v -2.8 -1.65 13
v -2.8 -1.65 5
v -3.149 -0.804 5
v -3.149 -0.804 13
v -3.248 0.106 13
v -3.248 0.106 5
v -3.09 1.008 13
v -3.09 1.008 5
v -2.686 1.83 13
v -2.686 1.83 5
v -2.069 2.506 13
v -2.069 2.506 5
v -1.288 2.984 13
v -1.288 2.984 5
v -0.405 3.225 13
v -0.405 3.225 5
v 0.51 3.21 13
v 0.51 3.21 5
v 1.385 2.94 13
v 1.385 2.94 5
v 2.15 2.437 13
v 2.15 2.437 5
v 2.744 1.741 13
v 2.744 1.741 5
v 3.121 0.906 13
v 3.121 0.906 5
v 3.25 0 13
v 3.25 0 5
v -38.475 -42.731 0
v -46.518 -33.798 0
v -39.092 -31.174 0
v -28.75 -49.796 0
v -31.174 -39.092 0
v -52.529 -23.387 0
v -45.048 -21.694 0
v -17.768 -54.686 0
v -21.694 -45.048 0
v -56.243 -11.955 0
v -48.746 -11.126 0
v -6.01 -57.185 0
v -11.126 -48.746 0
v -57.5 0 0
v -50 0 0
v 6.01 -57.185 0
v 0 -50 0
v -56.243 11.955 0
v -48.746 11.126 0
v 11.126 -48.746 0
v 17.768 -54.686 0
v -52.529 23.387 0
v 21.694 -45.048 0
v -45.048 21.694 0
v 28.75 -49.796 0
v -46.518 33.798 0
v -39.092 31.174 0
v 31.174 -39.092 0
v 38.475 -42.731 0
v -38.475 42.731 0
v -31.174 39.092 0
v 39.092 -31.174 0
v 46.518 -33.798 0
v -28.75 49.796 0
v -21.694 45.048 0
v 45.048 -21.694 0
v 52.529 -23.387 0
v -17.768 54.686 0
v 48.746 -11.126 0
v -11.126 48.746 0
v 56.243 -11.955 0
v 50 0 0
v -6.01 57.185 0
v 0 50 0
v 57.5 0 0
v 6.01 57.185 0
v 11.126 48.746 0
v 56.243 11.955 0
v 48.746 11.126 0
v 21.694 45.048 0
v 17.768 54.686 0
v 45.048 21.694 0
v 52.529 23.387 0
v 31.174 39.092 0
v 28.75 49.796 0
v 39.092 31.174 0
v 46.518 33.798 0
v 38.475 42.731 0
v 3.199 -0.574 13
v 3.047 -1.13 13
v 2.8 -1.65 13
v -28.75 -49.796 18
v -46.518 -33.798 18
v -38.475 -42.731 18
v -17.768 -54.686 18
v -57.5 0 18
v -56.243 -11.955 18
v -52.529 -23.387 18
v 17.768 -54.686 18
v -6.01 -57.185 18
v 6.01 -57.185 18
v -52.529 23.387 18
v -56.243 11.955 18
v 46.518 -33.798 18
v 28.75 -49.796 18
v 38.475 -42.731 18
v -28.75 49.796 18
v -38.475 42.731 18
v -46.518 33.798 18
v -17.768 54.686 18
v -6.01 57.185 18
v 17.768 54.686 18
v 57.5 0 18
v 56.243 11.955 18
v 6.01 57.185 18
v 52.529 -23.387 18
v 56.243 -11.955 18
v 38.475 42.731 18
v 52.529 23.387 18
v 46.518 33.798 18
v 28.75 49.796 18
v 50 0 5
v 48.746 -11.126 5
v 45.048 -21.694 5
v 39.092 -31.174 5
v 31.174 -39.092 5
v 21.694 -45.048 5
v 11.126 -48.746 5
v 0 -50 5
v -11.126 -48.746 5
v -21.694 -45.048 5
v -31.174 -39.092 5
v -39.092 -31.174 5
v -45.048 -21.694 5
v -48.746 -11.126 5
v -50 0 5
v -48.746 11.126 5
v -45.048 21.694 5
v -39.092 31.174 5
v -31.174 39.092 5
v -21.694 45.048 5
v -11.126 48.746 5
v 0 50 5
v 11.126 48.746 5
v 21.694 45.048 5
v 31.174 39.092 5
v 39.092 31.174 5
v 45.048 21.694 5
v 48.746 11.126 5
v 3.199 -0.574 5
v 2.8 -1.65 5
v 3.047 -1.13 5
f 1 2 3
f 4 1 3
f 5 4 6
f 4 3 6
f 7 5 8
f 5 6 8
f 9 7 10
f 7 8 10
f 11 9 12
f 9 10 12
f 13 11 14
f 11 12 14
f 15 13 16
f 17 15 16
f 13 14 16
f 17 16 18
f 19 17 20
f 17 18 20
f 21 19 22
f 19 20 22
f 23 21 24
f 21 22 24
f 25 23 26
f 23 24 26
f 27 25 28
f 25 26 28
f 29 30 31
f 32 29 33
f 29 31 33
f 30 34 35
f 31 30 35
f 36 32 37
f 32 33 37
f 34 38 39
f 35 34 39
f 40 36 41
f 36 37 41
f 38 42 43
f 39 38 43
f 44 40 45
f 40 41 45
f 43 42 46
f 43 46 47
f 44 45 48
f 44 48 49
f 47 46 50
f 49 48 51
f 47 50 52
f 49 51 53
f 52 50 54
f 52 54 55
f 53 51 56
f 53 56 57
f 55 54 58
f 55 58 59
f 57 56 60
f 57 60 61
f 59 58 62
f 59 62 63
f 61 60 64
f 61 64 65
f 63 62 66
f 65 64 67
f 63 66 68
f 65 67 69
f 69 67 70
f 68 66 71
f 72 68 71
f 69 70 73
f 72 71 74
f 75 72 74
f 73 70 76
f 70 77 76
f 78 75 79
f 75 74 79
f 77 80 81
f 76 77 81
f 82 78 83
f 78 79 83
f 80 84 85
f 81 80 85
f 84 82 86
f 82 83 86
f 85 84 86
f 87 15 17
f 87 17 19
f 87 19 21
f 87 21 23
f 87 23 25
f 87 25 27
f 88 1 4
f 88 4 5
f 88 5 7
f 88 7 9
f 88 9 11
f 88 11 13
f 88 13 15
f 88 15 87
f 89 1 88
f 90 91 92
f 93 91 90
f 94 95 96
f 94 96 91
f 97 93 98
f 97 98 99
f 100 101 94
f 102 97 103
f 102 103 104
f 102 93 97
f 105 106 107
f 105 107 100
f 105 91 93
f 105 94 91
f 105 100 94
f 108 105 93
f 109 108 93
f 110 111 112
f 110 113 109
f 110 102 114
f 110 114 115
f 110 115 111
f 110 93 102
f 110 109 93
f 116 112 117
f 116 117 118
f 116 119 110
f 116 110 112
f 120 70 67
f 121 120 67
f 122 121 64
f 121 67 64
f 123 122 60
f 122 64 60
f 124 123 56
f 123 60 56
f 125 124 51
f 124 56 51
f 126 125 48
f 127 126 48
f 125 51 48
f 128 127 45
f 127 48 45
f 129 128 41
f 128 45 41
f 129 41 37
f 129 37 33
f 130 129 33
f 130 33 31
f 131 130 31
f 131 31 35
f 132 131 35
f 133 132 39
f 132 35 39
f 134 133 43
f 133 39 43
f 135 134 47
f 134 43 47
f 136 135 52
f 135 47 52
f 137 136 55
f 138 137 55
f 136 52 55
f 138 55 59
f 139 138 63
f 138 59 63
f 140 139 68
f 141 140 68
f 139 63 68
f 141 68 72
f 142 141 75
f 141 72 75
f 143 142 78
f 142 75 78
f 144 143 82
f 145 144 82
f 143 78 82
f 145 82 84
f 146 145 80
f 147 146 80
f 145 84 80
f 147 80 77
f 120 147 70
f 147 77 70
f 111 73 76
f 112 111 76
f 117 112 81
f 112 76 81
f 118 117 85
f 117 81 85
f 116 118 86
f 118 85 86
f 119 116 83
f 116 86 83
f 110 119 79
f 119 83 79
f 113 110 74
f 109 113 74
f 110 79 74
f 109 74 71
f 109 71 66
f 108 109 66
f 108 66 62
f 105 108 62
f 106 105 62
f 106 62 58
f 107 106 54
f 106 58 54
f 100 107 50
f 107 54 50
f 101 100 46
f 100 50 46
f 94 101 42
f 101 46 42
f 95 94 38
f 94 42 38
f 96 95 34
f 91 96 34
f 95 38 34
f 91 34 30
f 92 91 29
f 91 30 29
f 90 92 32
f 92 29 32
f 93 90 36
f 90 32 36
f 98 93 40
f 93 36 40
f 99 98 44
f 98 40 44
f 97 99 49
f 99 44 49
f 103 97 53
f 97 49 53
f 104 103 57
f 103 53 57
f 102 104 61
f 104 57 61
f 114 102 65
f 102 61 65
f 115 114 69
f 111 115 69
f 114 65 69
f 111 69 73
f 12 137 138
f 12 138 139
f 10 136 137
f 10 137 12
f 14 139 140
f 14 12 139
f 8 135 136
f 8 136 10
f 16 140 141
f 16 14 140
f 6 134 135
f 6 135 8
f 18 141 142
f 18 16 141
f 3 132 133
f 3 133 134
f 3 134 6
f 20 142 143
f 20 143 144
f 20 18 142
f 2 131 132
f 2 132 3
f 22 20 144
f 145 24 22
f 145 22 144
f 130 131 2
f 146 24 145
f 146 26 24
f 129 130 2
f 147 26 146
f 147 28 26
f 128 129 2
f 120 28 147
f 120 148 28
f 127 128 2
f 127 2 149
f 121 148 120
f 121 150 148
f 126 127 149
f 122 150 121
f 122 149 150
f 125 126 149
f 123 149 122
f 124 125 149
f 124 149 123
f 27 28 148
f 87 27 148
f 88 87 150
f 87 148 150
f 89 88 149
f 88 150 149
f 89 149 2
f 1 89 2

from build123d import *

# Parameters (mm, degrees)
F0_R     = 57.5
F1_DEPTH = 18
F2_R     = 50
F3_DEPTH = 5
F5_DEPTH = 8


with BuildPart() as f1:
    # F0 (on Top) → F1 (new body)
    with BuildSketch(Plane.XY):
        Circle(F0_R)
    extrude(amount=F1_DEPTH)

    # F2 (on face) → F3 (cut)
    with BuildSketch(Plane(origin=(0, 0, 0), x_dir=(1, 0, 0), z_dir=(0, 0, -1))):
        Circle(F2_R)
    extrude(amount=-F3_DEPTH, mode=Mode.SUBTRACT)

    # F4 (on face) → F5 (cut)
    with BuildSketch(Plane(origin=(0, 0, 5), x_dir=(1, 0, 0), z_dir=(0, 0, -1))):
        with BuildLine():
            ThreePointArc((-2.8, 1.65), (-0.855132, -3.135482), (3.25, 0))
            ThreePointArc((3.25, 0), (3.135482, 0.855132), (2.8, 1.65))
            Line((2.8, 1.65), (-2.8, 1.65))
        make_face()
    extrude(amount=-F5_DEPTH, mode=Mode.SUBTRACT)


solid = f1.part
